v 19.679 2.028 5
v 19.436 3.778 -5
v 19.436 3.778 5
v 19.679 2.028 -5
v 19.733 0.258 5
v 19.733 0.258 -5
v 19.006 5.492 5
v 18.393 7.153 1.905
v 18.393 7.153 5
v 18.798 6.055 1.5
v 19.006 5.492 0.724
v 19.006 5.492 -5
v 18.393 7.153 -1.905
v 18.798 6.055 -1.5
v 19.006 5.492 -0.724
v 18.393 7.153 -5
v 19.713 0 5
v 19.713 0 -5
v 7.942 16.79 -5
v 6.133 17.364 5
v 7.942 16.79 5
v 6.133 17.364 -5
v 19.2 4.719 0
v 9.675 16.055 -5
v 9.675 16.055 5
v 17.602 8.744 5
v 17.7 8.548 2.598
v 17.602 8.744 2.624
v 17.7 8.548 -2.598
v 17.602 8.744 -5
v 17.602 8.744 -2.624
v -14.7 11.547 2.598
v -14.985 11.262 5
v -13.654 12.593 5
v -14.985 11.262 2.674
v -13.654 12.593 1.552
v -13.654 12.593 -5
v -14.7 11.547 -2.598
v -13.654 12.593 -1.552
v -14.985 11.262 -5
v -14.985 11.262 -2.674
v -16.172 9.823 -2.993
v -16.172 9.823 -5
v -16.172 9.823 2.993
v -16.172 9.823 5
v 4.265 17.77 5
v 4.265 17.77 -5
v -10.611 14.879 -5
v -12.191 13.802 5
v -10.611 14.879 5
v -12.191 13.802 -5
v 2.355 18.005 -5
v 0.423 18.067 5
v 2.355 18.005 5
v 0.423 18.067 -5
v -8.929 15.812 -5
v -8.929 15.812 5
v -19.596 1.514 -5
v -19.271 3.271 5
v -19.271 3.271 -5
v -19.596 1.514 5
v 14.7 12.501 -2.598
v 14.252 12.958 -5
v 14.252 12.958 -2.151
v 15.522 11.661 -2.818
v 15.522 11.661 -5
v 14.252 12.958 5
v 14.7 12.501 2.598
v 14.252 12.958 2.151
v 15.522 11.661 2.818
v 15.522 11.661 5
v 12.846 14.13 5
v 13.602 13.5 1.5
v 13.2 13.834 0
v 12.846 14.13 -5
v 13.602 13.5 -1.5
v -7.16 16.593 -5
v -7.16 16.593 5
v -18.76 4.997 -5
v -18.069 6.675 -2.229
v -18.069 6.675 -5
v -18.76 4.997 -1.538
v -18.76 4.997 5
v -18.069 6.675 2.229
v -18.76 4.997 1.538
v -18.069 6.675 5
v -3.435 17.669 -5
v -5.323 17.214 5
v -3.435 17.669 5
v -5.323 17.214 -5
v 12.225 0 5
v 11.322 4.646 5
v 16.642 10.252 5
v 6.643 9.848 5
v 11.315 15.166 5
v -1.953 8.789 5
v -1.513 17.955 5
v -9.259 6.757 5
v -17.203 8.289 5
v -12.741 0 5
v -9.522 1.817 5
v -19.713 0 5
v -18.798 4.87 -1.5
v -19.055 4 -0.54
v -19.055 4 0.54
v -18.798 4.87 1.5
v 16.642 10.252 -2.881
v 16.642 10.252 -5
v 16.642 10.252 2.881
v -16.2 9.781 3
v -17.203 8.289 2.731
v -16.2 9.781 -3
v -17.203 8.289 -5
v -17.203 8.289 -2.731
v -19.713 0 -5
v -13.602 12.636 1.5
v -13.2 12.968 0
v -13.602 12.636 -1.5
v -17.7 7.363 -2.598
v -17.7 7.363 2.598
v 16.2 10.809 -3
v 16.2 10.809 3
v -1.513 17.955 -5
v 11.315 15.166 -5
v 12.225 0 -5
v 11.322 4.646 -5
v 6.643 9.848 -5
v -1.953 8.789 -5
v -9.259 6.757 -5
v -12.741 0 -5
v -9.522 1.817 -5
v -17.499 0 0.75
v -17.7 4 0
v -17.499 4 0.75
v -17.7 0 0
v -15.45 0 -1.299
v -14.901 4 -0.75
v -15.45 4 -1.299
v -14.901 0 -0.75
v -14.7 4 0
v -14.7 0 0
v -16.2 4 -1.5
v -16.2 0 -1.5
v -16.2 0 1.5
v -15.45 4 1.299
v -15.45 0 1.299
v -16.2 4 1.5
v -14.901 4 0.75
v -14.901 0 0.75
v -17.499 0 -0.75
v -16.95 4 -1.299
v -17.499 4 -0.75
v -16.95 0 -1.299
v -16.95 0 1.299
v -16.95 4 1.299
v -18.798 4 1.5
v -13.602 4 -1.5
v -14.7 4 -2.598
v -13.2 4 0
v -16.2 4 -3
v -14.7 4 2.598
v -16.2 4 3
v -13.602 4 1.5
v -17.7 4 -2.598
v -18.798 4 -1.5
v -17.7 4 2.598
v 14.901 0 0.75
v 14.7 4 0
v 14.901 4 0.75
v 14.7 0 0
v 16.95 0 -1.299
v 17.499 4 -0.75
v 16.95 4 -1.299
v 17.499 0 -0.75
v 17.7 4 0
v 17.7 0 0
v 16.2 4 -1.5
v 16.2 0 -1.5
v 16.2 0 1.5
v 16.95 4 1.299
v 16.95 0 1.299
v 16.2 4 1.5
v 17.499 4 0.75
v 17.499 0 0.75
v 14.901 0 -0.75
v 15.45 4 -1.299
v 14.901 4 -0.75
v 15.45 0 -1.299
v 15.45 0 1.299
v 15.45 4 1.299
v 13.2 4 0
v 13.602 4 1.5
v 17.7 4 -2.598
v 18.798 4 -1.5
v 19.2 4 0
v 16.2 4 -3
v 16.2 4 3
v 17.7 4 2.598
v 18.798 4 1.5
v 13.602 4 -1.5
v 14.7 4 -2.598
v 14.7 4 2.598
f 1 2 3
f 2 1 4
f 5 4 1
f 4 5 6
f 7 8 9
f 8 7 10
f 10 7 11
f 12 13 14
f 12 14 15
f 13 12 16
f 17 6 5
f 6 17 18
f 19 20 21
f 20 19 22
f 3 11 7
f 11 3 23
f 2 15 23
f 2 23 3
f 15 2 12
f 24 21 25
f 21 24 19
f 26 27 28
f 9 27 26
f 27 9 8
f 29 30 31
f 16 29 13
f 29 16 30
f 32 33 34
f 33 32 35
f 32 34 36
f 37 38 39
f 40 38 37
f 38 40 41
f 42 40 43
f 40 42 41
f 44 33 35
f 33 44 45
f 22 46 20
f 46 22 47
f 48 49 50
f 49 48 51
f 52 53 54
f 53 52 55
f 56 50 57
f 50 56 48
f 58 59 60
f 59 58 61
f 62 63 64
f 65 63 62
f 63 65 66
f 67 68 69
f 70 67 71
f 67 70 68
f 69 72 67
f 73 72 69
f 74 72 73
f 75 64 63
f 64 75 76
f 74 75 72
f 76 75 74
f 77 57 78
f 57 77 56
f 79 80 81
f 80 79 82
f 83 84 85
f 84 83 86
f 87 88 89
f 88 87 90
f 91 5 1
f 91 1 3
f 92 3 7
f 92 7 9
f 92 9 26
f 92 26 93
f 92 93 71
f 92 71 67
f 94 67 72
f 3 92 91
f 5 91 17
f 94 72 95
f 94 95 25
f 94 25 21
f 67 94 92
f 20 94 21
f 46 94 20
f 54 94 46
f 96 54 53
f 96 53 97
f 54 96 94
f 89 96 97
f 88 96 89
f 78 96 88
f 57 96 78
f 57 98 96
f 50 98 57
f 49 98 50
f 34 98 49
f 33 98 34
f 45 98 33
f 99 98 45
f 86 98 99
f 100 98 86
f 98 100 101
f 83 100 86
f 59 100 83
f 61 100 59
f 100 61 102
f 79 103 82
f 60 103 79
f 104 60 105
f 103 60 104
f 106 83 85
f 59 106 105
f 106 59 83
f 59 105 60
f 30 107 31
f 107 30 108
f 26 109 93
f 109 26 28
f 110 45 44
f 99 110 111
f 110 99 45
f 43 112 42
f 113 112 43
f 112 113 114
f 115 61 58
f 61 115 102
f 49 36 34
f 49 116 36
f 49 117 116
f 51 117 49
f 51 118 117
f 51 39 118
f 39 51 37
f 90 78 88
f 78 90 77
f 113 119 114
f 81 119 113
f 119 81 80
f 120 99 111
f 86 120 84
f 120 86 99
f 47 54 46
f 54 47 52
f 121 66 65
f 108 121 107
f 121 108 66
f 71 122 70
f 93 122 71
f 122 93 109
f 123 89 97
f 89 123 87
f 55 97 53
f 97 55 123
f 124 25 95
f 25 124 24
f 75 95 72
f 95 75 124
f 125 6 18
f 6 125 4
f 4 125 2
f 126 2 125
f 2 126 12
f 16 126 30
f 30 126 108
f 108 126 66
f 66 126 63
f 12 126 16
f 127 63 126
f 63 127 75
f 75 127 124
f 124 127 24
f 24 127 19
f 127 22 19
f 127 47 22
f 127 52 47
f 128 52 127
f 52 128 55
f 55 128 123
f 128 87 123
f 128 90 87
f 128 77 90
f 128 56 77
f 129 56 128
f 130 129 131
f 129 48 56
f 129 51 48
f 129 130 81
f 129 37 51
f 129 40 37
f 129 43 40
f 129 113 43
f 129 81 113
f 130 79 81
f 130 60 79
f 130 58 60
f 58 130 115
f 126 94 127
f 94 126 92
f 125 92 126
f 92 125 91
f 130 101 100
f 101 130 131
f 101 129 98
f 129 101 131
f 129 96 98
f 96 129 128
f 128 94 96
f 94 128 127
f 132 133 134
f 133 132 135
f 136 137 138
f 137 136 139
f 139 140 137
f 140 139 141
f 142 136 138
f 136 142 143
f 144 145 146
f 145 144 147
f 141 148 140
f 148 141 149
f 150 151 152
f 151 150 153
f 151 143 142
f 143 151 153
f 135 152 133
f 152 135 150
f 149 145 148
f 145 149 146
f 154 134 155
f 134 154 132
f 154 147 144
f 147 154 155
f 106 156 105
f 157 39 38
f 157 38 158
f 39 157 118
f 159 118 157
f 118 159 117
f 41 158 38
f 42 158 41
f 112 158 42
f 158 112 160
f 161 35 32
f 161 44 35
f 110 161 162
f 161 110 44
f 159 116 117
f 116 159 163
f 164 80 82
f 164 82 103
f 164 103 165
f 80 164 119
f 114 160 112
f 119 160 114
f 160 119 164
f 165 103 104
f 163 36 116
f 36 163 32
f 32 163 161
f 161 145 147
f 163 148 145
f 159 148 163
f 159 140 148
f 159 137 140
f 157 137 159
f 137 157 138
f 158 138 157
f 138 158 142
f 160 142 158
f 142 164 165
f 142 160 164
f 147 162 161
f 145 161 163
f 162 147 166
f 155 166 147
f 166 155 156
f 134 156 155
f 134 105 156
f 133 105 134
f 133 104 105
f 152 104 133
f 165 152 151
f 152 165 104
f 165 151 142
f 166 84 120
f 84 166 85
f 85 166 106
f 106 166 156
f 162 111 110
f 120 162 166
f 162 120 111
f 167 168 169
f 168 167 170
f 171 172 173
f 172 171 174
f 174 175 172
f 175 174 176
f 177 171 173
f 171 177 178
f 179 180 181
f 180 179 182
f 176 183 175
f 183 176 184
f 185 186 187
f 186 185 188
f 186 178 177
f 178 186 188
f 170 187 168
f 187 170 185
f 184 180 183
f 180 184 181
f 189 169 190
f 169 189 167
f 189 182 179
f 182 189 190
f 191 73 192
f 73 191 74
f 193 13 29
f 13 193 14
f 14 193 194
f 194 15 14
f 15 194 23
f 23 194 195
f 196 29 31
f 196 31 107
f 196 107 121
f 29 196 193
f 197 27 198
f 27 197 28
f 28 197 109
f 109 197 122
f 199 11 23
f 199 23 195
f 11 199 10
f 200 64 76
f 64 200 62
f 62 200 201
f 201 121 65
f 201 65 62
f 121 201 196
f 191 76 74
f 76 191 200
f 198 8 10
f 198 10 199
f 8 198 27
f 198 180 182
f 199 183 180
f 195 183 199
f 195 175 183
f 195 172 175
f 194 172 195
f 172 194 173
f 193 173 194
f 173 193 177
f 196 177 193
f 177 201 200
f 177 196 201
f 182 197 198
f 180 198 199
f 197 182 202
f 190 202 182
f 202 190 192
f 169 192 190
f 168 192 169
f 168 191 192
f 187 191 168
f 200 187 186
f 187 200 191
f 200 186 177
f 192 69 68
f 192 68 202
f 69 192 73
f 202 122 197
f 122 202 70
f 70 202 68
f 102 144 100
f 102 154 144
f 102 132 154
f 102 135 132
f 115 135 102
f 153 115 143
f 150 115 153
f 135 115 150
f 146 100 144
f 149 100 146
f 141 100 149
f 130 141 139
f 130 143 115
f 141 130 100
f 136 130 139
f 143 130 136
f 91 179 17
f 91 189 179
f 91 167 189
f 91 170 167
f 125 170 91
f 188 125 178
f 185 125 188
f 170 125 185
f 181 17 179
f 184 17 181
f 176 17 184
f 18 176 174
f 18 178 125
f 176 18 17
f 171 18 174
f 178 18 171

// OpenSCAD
// file: linactuator.scad
gore=1; // napravi gornji dio
dolje=0; // napravi donji dio
presjek=0; // vizualiziraj unutrasnjost
plocice=0;

podizac_xy=25;

sarafi_xy=15;
sarafi_navoj_d=1.8; // rupa za navoj sarafa gore
sarafi_navoj_h=15; // gornja dubina rupe
sarafi_prolaz_d=2.5; // poklopac
sarafi_plocice_d=2.1;
// sarafi_h=10; // dubina rupe za saraf
sarafi_navoj_d_dolje=1.8; // dolje za mali saraf
sarafi_navoj_h_dolje=15; // donja dubina rupe

krug_d=10;
krug_h=0; // 0 disable mali krug oko sipke

rez_h=4; // dužina odrezanog dijela
rez_d=0.1; // veličina samog reza

matica_d=10.7;  // širina 6-kutne rupe da matica lagano prođe. Matica je široka 10 mm
ulaz_matica_h=0.6*2; // dubina proširenog ulaza za maticu
ulaz_matica_d=matica_d+2*ulaz_matica_h; // veličina proširenog ulaza
//matica_h=22.4; // dubina rupe za 2 matice i feder (2 matica su dugačke 8.3 mm, neopterećen feder je 13 mm)
matica_h=8.3+13; // feder 13 mm
podizac_h=matica_h+7; // +7 povecava sloj plastike koji drži maticu
sipka_d=7; // rupa za navojnu šipku, dosta lufta
prijelaz_h=(matica_d-sipka_d)*0; // visina konusnog 6-kutnog prijelaza od matice prema rupi za šipku da ne padnu slojevi

module linactuator()
{
if(gore > 0.5 || dolje > 0.5)
union()
{
  difference()
  {
    union()
    {
      cube([podizac_xy, podizac_xy,podizac_h],center=true);
      translate([0,0,podizac_h/2+krug_h/2])
        cylinder(d=krug_d,h=krug_h,$fn=50,center=true);
    }  
    union()
    {
      // sarafi kroz sve
      for(i=[0:3])
        rotate([0,0,90*i])
        {
          // navoj sarafa (gore)
          translate([sarafi_xy/2,sarafi_xy/2,podizac_h/2-sarafi_navoj_h/2])
            cylinder(d=sarafi_navoj_d,h=sarafi_navoj_h+0.001,$fn=50,center=true);
          // navoj sarafa (dolje)
          translate([sarafi_xy/2,sarafi_xy/2,-podizac_h/2+sarafi_navoj_h_dolje/2])
            cylinder(d=sarafi_navoj_d_dolje,h=sarafi_navoj_h_dolje+0.001,$fn=50,center=true);
          // rupa kroz donji odrezani dio
          translate([sarafi_xy/2,sarafi_xy/2,-podizac_h/2+rez_h/2])
            cylinder(d=sarafi_prolaz_d,h=rez_h+0.001,$fn=50,center=true);
  
        }
      // rez koji odvaja 2 dijela polovice
      translate([0,0,-podizac_h/2+rez_h])
        cube([podizac_xy,podizac_xy,rez_d],center=true);

      // skorz uklonit donji dio
      if( dolje == 0 )
      {
        translate([0,0,-podizac_h/2+rez_h/2])
          cube([podizac_xy+0.001,podizac_xy+0.001,rez_h+0.001],center=true);
      }

      // skorz uklonit gornji dio
      if( gore == 0 )
      {
        translate([0,0,-podizac_h/2+rez_h+(podizac_h+krug_h-rez_h)/2])
          cube([podizac_xy+0.001,podizac_xy+0.001,(podizac_h+krug_h-rez_h)+0.001],center=true);
      }

      // rupa za navojnu šipku
      cylinder(d=sipka_d,h=2*podizac_h,$fn=50,center=true);

      // 6-kutna rupa za matice
      translate([0,0,(-podizac_h/2+rez_h)+matica_h/2])
        cylinder(d=matica_d*2/sqrt(3),h=matica_h+0.001,$fn=6,center=true);

      // konusni 6-kutni prošireni ulaz za matice
      translate([0,0,(-podizac_h/2+rez_h)+ulaz_matica_h/2])
        cylinder(d1=ulaz_matica_d*2/sqrt(3),d2=matica_d*2/sqrt(3),h=ulaz_matica_h+0.001,$fn=6,center=true);

      // konusni 6-kutni prijelaz od matice prema rupi,
      // da ne padnu isprintani slojevi
      translate([0,0,(-podizac_h/2+rez_h)+matica_h+prijelaz_h/2])
        cylinder(d1=matica_d*2/sqrt(3),d2=sipka_d,h=prijelaz_h+0.001,$fn=6,center=true);
      
      // kocka za presjek radi vizualizacije unutrasnjosti
      if(presjek)
      translate([podizac_xy/2,0,0])
      cube([podizac_xy,podizac_xy+0.01,podizac_h*2],center=true);
    }
  }
}
if(plocice > 0.5)
    spaceri();
}

module spaceri()
{
  d=[0.5,1,2];
  for(i = [0:len(d)-1])
  {
    translate([podizac_xy*1.5*(i-1),0,d[i]/2])
      difference()
      {
        cube([podizac_xy,podizac_xy,d[i]],center=true);
        // 6-kutne rupe za maticu
        cylinder(d=matica_d*2/sqrt(3),h=d[i]+0.001,$fn=6,center=true);
      // sarafi kroz sve
        for(j=[0:3])
          rotate([0,0,90*j])
          {
          translate([sarafi_xy/2,sarafi_xy/2,0])
            cylinder(d=sarafi_plocice_d,h=d[i]+0.001,$fn=50,center=true);
              // 
          }
      }
  }
}

//linactuator();
// file: motor_holder.scad
module motor_base_plate(a=55,b=55,thick=3,d=10)
{
  minkowski()
  {
    difference()
    {
      cube([a-d,b-d,thick/2],center=true);
      // reduce unused material
      if(0)
      for(i=[-1:2:1])
      translate([50*i,-48,0])
        rotate([0,0,45*i])
          cube([100,100,thick/2+0.001],center=true);
    }
    // round edges
    cylinder(d=d,h=thick/2,$fn=32,center=true);
  }
}

module motor_spacer()
{
  spacer_len=21;
  d1=4.5; // inner dia
  d2=10;   // outer dia
  difference()
  {
    cylinder(d=d2,h=spacer_len,$fn=32);
    translate([0,0,-0.001])
      cylinder(d=d1,h=spacer_len+0.002,$fn=32);
  }
}

module motor_box()
{
screw_len = 9.5;
thick=3; // thickness of the holder
translate([0,0,screw_len-8-21.5])
  difference()
  {
    motor_base_plate(thick=40);
    // inside cut
    translate([0,0,-0.01])
    motor_base_plate(a=45,b=45,thick=41,d=7);
    // angular cut, print faster
    translate([-10-45/2,0,0])
      rotate([0,-45,0])
      cube([40,60,100],center=true);
  }
}

module motor_holder()
{
// coordinates for mounting screws
mountscrew_pos = [[-34,5,0],[0,-32,0],[34,5,0]];
motor_center = [0,0,0];
screw_len = 9.5;
thick=3; // thickness of the holder
d_mixer_hole=34; // should be ok for parts to go freely

// mount screws
if(0)
%for(i=[0:2])
  translate(mountscrew_pos[i])
    cylinder(d=4,h=screw_len,$fn=12);

translate([0,0,screw_len-8])
  difference()
  {
    motor_base_plate();
    // axis hole
    translate(motor_center)
      rotate([0,0,360/16])
      cylinder(d=d_mixer_hole,h=thick+0.001,$fn=8,center=true);
    // motor mounting 4 holes M3-thru
    translate(motor_center)
      for(i=[0:3])
        rotate([0,0,90*i])
          translate([-31.5/2,-31.5/2,0]) // motor holes positions
            cylinder(d=3.3,h=thick+0.001,$fn=12,center=true);
    // plate mounting 3 holes M4-thru
    if(0)
    for(i=[0:2])
      translate(motor_center+mountscrew_pos[i])
        cylinder(d=4.5,h=thick+0.001,$fn=12,center=true);

  }
}


if(0)
  motor_holder();

if(0)
  motor_spacer();
// file: clamp3pod.scad
// clamp for tripod "Vanguard VT-528A"

clamp_rot = [0,0,-11];
rod_pos = [-6.5,-7,0];

module contour()
{
  polygon(points=[
    [  0.0,  0.0], // desno od polukruga
    [  6.3, -0.5], // unutarnja strana blago zakrivljeni dio, skoro ravni
    [ 13.5,  0.0], // tocka na sredini zakrivljenja
    [ 16.5,  5.0], // zakrivljeniji dio
    [ 16.5,  9.0], // tocka na srediji zakrivljenja
    [ 11.0, 15.0], // ravni kosi vanjski dio
    [ -1.0, 15.0], // ravni vanjski dio
    [ -4.0, 10.5], // tocka na sredini zakrivljenja
    [ -4.0,  5.0], // zakrivljeni dio
    [ -1.0,  4.0]  // tocka na sredini polukružnog dijela
  ]);
}

module rod_profile(h=1,s=1)
{
  scale([s,s,1])
  linear_extrude(height = h, center = true, convexity = 10, scale=1)
    contour();
}

module clamp(size=1,height=10)
{
  difference()
  {
    scale([1.1*size,size,1])
    cylinder(d=30,h=height,$fn=64,center=true);
    scale([size,size,1])
    translate(rod_pos)
      rod_profile(h=height+1,s=1);
  }
}

module print_clamp_half(i=1,size=1,height=10)
{
  difference()
  {
    rotate(clamp_rot)
    clamp(size,height);
    translate([0,i*50,0])
      cube([100,100,height+1],center=true);
    for(j=[-1,1])
    translate([j*13.5*size,0,0])
    if(i > 0)
    rotate([90,0,0])
    {
      translate([0,0,-0.1])
      cylinder(d=3,h=100,$fn=12,center=false);
      translate([0,0,4])
      cylinder(d=6,h=100,$fn=12,center=false);
    }
    else
      rotate([-90,0,0])
        translate([0,0,-0.1])
        cylinder(d=1.8,h=7,$fn=12,center=false);
  }
}

/*
//size = 1.0; // small
size = 1.2; // middle
for(i=[-1,1])
  translate([0,-i])
     print_clamp_half(i,size);
*/
// main file
include <clamp3pod.scad>
include <motor_holder.scad>
include <linactuator.scad>
/*---------------
size = 1.0; // small
// size = 1.2; // middle
for(i=[-1,1])
  translate([0,-i])
     print_clamp_half(i,size);
*/

actuator_pos = [-26,-30,  0];
actuator_rot = [  0,  0, 45];

module actuator_holder()
{
  difference()
  {
    translate([5,0,2])
    cube([35,25,4],center=true);
    cylinder(d=7,h=10,$fn=16,center=true);
    for(i=[-1,1])
      for(j=[-1,1])
        translate([i*15/2,j*15/2])
          cylinder(d=2,h=40,$fn=16,center=true);
  }
}

module actuator_holder_3pod()
{
  scal=1.2;
  // [[xyz pos], height],
  clamps =
  [
    [[0,0, 37  ],12],
    [[0,0, 21.5],19],
    [[0,0, 6   ],12],
  ];
  clamp_trans = [0,0,9];
  clamp1_rot = [180,0,0];
  difference()
  {
    union()
    {
    for(ct = clamps)
    translate(ct[0])
      rotate(clamp1_rot)
        {
          print_clamp_half(i=-1,size=scal,height=ct[1]);
        }
    translate(actuator_pos)
      rotate(actuator_rot)
        translate([0,0,14.15])
        rotate([180,0,0])
        linactuator();
        //actuator_holder();
      // holder reinforcement
      if(1)
      translate([-8,-12,12])
        rotate(actuator_rot)
        translate([-5.5,0,0])
        cube([20,25,24],center=true);
    }
    if(1)
    for(ct = clamps)
    translate(ct[0])
      rotate(clamp1_rot)
      rotate(clamp_rot)
      scale([scal,scal,1])
      translate(rod_pos)
          rod_profile(h=100,s=1);
  }
    
}

module actuator_clamp()
{
   scal=1.2;
   clamp1_rot = [180,0,0];
   rotate(clamp1_rot)
     print_clamp_half(i=1,size=scal,height=10);
}

//actuator_holder_3pod();
actuator_clamp();
